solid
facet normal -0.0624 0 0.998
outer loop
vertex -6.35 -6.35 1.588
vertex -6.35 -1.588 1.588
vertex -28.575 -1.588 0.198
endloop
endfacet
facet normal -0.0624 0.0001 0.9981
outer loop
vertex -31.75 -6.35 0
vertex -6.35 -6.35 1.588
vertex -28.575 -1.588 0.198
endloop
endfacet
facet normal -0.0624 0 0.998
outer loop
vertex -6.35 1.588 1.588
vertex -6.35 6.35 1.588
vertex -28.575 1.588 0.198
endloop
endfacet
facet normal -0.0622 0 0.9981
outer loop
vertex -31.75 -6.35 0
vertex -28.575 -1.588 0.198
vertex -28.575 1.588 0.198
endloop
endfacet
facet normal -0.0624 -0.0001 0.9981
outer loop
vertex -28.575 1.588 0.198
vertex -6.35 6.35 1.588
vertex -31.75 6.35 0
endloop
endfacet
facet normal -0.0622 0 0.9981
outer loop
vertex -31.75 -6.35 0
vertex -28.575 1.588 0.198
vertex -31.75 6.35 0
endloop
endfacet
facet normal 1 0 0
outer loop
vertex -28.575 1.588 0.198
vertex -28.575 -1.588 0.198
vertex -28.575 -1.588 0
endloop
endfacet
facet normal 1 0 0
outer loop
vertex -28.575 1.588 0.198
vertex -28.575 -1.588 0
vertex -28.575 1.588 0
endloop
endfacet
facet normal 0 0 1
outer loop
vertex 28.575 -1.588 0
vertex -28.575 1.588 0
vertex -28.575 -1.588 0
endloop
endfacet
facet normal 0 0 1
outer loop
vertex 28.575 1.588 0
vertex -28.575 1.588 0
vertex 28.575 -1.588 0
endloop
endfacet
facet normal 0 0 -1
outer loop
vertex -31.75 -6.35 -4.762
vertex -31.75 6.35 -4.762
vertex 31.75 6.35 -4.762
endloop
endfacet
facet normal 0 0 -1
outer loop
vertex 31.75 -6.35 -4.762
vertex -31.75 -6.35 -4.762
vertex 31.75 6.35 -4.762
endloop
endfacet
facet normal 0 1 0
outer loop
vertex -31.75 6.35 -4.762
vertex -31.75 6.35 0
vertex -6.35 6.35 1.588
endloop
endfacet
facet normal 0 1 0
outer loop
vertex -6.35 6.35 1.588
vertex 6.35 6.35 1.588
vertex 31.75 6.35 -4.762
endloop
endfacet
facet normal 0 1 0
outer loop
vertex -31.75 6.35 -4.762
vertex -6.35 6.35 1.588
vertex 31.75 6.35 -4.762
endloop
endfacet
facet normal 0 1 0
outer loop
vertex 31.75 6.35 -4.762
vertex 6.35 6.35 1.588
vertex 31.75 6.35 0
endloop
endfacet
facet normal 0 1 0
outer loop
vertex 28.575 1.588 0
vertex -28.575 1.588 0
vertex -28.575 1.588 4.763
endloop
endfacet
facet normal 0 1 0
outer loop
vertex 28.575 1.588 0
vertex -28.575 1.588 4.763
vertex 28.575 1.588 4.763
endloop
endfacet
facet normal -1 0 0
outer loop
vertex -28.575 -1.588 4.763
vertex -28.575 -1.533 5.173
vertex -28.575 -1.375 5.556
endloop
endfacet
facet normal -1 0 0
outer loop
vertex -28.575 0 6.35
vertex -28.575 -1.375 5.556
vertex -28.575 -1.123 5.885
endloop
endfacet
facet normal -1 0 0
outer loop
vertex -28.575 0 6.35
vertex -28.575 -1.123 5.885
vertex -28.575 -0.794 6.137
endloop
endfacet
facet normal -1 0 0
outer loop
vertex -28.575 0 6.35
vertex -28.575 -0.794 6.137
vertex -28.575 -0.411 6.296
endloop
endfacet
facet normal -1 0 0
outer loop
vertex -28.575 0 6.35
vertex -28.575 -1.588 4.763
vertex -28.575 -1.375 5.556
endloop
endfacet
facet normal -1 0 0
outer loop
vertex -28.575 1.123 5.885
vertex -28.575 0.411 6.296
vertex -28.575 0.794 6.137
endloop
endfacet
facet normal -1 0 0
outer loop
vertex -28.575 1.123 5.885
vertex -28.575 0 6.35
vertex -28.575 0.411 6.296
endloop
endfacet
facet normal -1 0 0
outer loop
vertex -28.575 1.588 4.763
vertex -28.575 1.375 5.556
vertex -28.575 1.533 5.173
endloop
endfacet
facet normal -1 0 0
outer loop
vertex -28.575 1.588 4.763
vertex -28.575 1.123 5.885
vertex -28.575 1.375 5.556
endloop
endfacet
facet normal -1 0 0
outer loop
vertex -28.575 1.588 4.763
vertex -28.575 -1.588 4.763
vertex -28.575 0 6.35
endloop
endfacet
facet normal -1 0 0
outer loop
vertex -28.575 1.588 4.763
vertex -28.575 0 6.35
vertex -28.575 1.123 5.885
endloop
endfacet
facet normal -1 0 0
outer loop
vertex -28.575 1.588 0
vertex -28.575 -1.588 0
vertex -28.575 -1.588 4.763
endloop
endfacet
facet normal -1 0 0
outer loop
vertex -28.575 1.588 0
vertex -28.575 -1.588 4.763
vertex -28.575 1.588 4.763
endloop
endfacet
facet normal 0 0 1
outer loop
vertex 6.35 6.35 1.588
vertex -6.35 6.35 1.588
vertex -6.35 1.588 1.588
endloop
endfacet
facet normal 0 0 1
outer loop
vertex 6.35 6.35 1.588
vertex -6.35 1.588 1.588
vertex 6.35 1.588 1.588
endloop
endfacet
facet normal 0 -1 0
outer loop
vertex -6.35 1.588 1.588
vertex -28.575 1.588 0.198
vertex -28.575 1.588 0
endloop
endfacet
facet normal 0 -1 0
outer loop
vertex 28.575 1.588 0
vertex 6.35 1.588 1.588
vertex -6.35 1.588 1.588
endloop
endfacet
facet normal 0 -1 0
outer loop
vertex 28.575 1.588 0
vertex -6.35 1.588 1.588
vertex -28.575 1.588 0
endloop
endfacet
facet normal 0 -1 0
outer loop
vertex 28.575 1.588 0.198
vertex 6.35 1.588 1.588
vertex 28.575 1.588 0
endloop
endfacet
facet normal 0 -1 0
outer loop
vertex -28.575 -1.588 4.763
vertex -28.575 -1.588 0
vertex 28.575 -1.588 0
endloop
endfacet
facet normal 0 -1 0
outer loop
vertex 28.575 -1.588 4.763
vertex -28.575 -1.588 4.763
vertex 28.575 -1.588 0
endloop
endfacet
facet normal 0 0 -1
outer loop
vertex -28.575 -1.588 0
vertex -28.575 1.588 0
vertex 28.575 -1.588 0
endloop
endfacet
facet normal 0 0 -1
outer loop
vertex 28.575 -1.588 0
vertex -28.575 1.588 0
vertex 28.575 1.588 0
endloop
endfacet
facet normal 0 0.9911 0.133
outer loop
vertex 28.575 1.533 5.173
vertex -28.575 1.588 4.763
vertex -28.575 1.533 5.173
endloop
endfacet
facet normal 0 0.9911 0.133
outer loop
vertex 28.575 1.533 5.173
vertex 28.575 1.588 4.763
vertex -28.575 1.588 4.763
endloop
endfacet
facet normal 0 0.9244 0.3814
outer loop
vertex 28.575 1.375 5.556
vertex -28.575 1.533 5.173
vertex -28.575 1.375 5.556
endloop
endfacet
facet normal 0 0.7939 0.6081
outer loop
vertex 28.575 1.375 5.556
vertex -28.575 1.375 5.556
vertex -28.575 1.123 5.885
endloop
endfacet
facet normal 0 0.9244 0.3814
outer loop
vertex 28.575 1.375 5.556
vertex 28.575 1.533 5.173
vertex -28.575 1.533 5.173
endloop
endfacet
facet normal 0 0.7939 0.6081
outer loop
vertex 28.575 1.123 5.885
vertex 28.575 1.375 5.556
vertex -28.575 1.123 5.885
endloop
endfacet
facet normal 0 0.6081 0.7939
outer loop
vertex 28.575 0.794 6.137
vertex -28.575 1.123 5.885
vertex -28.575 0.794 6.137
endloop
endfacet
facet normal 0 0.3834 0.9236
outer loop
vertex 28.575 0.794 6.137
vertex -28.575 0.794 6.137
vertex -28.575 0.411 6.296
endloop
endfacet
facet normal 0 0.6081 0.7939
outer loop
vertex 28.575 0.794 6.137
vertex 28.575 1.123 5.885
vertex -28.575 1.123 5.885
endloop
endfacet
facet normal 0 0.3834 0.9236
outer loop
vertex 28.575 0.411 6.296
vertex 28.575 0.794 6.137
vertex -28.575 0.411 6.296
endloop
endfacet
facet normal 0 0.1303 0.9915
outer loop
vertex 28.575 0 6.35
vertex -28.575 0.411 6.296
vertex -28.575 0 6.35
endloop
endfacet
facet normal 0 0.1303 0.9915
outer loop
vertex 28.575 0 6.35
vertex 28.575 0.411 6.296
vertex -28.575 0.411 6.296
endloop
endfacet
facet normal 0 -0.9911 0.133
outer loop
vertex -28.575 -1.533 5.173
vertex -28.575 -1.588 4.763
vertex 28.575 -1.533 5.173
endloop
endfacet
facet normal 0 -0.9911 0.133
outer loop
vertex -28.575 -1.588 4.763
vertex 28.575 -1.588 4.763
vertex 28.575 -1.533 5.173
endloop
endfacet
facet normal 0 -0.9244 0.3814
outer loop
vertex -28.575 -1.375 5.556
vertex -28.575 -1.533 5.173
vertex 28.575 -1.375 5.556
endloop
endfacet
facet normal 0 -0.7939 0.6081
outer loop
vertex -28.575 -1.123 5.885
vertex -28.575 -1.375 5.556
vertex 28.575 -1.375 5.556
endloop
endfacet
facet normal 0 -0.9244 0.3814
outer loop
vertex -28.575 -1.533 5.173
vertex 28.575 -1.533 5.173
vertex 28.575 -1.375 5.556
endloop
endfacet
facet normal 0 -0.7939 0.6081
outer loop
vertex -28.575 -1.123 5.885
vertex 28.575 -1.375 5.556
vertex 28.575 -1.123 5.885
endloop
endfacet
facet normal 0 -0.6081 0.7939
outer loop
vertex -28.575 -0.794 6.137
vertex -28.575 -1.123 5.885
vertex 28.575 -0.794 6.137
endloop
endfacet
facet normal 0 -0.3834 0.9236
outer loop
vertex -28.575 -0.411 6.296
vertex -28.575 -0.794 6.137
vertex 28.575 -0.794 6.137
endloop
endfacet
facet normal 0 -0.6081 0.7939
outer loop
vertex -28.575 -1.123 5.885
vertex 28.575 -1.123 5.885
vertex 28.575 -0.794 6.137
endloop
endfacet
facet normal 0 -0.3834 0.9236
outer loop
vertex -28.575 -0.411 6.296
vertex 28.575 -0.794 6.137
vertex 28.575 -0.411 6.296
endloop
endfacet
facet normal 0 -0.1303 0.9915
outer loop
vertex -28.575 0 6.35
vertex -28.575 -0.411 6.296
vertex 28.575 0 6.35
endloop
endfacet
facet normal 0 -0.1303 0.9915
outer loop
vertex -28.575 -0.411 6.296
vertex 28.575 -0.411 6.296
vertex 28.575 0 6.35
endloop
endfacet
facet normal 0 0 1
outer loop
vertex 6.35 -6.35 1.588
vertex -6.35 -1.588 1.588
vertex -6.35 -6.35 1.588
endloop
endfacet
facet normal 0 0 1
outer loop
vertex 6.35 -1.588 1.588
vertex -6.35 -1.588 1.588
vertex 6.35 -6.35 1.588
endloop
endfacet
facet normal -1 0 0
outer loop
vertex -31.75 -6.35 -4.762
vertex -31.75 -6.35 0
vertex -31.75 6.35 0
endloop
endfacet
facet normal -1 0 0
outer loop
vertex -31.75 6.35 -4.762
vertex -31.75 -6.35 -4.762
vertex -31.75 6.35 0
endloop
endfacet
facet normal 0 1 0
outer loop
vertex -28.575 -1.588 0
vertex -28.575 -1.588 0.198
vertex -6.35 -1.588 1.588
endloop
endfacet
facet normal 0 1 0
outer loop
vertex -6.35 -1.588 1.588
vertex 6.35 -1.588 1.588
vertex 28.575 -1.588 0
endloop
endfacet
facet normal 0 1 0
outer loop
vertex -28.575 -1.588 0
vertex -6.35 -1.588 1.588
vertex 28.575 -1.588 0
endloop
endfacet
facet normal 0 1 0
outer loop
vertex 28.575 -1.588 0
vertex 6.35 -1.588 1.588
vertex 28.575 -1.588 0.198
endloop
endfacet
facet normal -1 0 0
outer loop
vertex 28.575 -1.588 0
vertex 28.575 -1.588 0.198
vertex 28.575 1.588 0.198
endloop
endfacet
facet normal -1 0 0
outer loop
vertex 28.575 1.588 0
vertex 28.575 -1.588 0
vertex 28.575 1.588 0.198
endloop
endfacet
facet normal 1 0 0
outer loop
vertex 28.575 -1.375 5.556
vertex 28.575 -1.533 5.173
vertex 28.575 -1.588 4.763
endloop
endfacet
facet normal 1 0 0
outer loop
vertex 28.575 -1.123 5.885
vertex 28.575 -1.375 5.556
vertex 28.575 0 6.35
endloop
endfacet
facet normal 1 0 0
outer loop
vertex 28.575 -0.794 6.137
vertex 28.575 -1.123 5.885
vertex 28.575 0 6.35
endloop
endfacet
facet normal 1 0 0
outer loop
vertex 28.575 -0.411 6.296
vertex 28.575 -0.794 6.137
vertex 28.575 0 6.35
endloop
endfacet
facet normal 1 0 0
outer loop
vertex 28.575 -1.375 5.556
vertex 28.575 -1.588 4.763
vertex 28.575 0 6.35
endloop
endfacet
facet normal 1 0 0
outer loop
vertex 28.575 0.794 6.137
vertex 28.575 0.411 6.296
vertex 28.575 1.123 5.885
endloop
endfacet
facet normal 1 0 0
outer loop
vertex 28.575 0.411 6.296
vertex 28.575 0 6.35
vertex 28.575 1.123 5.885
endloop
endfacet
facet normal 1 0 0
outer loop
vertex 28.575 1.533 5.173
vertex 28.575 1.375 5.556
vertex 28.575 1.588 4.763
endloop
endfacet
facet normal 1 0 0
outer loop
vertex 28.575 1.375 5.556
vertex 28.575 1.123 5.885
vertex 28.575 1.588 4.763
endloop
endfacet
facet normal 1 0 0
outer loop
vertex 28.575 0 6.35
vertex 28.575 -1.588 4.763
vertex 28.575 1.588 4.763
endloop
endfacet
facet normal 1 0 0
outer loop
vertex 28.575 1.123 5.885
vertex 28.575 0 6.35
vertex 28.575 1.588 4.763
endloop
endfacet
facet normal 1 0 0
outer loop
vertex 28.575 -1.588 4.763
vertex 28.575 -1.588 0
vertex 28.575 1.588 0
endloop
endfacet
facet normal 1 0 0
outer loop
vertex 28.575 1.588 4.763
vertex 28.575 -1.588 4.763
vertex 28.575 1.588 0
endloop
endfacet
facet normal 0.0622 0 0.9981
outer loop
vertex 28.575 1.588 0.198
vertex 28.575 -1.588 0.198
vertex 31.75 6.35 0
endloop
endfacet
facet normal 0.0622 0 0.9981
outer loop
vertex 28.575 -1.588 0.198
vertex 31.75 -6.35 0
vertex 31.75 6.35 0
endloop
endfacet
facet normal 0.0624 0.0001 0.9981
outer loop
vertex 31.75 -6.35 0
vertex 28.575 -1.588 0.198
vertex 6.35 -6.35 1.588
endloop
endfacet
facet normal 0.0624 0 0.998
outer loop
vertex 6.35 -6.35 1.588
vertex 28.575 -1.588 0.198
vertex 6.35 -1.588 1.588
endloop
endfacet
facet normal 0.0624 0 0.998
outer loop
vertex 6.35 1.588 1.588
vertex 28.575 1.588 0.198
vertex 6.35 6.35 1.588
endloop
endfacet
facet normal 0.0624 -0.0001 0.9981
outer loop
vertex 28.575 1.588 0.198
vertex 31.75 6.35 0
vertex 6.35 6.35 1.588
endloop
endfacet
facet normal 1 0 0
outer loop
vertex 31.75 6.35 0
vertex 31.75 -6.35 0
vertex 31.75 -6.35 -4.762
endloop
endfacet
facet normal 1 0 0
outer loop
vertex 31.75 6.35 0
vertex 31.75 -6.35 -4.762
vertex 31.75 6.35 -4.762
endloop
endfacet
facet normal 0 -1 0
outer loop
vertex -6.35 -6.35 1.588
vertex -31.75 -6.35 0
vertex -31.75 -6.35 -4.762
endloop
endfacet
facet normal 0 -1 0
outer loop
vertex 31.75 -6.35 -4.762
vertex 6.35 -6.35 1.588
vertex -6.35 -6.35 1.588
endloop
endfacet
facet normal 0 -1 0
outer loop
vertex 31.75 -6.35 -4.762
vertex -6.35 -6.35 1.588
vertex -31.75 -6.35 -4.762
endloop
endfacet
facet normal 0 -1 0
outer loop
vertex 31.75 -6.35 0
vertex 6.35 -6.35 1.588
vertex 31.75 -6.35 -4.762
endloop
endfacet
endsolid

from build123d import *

# Parameters (mm, degrees)
F0_W        = 63.5
F0_H        = 12.7
F0_W_2      = 57.15
F0_H_2      = 3.175
F1_DEPTH    = 1.5875
F2_DEPTH    = 1.5875
F3_DEPTH    = 6.35
F4_R        = 1.58749
F5_T1_DEPTH = 144.7704872523
F6_DEPTH    = 3.175


# Not quite as in the source:
# - a fillet or chamfer that OpenCascade refuses, or shapes differently, is made with other operations: its cross-section is extruded or revolved along the edge and cut away or added
# - a fillet or chamfer is up to 0.001 mm smaller than in the source, because OpenCascade refuses the exact size


with BuildPart() as f1:
    # F0 (on Top) → F1 (new body, symmetric)
    with BuildSketch(Plane.XY):
        Rectangle(F0_W, F0_H)
        Rectangle(F0_W_2, F0_H_2, mode=Mode.SUBTRACT)
    extrude(amount=F1_DEPTH, both=True)

    # F0 (on Top) → F2 (join)
    with BuildSketch(Plane.XY):
        Rectangle(F0_W_2, F0_H_2)
    extrude(amount=-F2_DEPTH)

    # F5: chamfer of 25.4 x 1.5875 on 2 edges, made by hand

    # F5_s2 → F5_t1 (cut)
    with BuildSketch(Plane.XZ.offset(-72.3852436262)):
        Polygon((-6.35, 1.5875), (-31.75, 0), (-31.75, 1.5875), align=None)
        Polygon((31.75, 0), (6.35, 1.5875), (31.75, 1.5875), align=None)
    extrude(amount=F5_T1_DEPTH, mode=Mode.SUBTRACT)

    # F6 (add): a face of the model
    f6_faces = [f1.faces().sort_by_distance(p)[0] for p in [
        (0, 0, -1.5875),
    ]]
    extrude(f6_faces, amount=F6_DEPTH)


with BuildPart() as f3:
    # F0 (on Top) → F3 (new body)
    with BuildSketch(Plane.XY):
        Rectangle(F0_W_2, F0_H_2)
    extrude(amount=F3_DEPTH)

    # F4 (radius 1.5875 in the source; OpenCascade refuses exactly that, so slightly less here)
    f4_edges = [f3.edges().sort_by_distance(p)[0] for p in [
        (0, -1.5875, 6.35),
        (0, 1.5875, 6.35),
    ]]
    fillet(f4_edges, radius=F4_R)


solid = Compound([f1.part, f3.part])
